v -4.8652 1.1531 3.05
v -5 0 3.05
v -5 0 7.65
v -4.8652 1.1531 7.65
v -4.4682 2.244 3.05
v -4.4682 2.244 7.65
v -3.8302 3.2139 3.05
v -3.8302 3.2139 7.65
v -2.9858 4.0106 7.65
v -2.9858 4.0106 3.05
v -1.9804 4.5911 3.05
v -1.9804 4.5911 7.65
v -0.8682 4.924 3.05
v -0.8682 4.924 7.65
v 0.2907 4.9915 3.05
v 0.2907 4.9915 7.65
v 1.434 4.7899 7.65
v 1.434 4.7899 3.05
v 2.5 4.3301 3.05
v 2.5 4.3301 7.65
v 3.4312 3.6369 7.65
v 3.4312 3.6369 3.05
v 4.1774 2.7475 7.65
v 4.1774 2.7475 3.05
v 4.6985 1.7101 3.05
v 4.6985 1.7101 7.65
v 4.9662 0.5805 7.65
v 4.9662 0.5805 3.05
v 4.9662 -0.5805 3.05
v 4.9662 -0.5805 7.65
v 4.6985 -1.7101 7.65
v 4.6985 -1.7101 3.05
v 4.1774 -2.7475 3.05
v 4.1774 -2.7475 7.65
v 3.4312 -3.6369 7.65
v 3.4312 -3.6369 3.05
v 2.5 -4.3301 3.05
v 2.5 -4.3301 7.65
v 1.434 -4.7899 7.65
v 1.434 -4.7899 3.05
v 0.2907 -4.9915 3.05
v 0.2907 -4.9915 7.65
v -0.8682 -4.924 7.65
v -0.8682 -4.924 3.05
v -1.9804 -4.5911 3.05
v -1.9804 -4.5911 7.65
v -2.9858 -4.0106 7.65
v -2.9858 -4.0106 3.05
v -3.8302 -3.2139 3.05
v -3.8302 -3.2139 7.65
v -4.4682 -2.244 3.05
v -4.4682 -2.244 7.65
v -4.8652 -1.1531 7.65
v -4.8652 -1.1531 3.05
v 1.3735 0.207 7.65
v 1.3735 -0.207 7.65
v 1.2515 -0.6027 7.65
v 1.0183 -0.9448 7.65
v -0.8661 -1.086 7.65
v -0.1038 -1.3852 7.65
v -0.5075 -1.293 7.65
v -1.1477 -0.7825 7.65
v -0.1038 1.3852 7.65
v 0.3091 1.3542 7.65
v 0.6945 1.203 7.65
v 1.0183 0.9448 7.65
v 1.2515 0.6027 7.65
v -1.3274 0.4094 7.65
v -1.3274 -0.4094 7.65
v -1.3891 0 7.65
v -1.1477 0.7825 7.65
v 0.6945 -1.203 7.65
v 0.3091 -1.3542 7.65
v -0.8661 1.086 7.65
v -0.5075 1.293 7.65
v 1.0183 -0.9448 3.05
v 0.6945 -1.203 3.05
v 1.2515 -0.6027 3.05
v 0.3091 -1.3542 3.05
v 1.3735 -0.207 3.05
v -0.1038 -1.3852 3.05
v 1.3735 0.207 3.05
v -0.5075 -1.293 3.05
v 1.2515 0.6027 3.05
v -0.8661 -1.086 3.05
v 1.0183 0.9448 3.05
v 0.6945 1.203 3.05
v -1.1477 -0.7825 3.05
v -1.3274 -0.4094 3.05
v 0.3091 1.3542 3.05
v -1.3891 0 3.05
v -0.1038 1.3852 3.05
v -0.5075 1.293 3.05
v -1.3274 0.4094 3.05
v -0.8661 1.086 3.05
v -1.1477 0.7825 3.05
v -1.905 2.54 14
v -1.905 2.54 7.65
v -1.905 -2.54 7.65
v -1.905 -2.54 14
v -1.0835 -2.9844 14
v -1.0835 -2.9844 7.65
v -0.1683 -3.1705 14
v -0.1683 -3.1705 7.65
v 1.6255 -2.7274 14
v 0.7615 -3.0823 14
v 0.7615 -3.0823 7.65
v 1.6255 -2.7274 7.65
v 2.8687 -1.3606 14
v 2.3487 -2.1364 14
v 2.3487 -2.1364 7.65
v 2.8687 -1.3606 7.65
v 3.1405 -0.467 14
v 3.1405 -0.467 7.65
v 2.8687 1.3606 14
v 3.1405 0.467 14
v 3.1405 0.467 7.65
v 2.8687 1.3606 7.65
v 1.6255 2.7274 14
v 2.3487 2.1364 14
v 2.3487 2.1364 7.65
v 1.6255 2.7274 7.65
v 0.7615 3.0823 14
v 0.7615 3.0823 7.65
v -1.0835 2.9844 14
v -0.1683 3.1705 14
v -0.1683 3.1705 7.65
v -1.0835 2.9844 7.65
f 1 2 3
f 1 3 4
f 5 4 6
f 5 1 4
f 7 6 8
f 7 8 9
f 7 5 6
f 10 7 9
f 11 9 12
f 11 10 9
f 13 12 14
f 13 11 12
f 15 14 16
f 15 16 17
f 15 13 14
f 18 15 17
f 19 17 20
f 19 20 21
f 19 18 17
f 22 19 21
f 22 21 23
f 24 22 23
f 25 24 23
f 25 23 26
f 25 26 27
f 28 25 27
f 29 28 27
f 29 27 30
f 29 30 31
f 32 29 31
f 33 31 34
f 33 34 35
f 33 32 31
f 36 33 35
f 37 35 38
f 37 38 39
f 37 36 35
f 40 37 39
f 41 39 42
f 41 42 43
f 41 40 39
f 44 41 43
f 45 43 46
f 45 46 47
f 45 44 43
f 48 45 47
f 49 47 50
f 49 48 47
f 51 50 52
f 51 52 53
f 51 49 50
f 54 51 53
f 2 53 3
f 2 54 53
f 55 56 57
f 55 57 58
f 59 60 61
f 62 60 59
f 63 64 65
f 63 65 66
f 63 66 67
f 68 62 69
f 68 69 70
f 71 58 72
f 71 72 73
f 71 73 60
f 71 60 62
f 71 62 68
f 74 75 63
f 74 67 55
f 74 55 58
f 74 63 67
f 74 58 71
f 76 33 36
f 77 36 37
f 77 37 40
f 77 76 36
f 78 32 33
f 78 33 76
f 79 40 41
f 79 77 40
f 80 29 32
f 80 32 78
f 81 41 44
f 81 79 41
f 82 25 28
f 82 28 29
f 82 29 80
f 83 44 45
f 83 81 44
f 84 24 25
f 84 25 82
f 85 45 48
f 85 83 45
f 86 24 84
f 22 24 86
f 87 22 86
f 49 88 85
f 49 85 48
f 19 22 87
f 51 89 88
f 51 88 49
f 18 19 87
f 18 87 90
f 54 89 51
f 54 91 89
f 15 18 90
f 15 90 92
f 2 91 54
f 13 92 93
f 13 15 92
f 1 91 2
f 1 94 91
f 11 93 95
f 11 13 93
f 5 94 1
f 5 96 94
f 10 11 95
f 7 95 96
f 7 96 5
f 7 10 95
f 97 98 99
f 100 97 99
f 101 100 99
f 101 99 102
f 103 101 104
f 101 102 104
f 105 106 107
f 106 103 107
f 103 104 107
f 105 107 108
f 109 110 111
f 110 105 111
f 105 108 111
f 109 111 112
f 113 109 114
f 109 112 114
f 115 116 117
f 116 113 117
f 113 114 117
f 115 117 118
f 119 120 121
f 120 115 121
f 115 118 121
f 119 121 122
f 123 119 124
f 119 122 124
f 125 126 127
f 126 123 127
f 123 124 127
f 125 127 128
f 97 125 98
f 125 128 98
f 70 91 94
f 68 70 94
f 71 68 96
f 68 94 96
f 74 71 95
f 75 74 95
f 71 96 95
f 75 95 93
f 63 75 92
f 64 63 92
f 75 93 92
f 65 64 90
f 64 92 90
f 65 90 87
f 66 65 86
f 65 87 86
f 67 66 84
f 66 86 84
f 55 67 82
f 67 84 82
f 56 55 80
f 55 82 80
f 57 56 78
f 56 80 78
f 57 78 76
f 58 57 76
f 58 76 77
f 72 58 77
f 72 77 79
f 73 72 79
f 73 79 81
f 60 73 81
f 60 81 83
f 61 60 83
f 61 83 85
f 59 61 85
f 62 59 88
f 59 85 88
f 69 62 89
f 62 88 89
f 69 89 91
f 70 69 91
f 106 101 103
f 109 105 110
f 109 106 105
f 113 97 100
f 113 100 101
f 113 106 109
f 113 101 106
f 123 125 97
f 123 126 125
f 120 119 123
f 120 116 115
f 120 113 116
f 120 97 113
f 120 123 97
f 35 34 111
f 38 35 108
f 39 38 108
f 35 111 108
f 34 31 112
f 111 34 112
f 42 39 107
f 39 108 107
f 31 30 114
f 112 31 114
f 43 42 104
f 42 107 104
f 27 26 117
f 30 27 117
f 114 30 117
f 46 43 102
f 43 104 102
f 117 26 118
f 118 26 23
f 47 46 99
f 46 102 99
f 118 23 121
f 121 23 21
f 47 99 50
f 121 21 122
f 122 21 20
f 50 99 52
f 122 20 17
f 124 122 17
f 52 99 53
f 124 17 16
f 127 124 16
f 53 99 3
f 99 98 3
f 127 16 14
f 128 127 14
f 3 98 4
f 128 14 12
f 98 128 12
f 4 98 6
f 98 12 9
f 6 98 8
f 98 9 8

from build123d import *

# Parameters (mm, degrees)
SKETCH1_R           = 3.175
BOSS_EXTRUDE1_DEPTH = 14
CUT_EXTRUDE2_START  = -6.35
CUT_EXTRUDE2_DEPTH  = 6.35
SKETCH7_R           = 3.175
CUT_EXTRUDE4_DEPTH  = 3.05
SKETCH9_R           = 5
SKETCH9_R_2         = 1.3890625
BOSS_EXTRUDE2_DEPTH = 4.6
SKETCH9_3_R         = 1.3890625
CUT_EXTRUDE5_DEPTH  = 4.6


with BuildPart() as part:
    # Sketch1 → Boss-Extrude1 (new body)
    with BuildSketch(Plane.XY):
        Circle(SKETCH1_R)
    extrude(amount=BOSS_EXTRUDE1_DEPTH)

    # Sketch2 → Cut-Extrude2 (cut)
    with BuildSketch(Plane.XY.offset(14).offset(CUT_EXTRUDE2_START)):
        with BuildLine():
            Line((-1.905, 2.54), (-1.905, -2.54))
            ThreePointArc((-1.905, -2.54), (-3.175, 0), (-1.905, 2.54))
        make_face()
    extrude(amount=CUT_EXTRUDE2_DEPTH, mode=Mode.SUBTRACT)

    # Sketch7 → Cut-Extrude4 (cut)
    with BuildSketch(Plane(origin=(0, 0, 0), x_dir=(-1, 0, 0), z_dir=(0, 0, -1))):
        with Locations(Location((0, 0, 0), (0, 0, 306.869897646))):
            Circle(SKETCH7_R)
    extrude(amount=-CUT_EXTRUDE4_DEPTH, mode=Mode.SUBTRACT)

    # Sketch9 → Boss-Extrude2 (add)
    with BuildSketch(Plane(origin=(0, 0, 3.05), x_dir=(-1, 0, 0), z_dir=(0, 0, -1))):
        Circle(SKETCH9_R)
        Circle(SKETCH9_R_2, mode=Mode.SUBTRACT)
    extrude(amount=-BOSS_EXTRUDE2_DEPTH)

    # Sketch9<3> → Cut-Extrude5 (cut)
    with BuildSketch(Plane(origin=(0, 0, 3.05), x_dir=(-1, 0, 0), z_dir=(0, 0, -1))):
        Circle(SKETCH9_3_R)
    extrude(amount=-CUT_EXTRUDE5_DEPTH, mode=Mode.SUBTRACT)


solid = part.part
